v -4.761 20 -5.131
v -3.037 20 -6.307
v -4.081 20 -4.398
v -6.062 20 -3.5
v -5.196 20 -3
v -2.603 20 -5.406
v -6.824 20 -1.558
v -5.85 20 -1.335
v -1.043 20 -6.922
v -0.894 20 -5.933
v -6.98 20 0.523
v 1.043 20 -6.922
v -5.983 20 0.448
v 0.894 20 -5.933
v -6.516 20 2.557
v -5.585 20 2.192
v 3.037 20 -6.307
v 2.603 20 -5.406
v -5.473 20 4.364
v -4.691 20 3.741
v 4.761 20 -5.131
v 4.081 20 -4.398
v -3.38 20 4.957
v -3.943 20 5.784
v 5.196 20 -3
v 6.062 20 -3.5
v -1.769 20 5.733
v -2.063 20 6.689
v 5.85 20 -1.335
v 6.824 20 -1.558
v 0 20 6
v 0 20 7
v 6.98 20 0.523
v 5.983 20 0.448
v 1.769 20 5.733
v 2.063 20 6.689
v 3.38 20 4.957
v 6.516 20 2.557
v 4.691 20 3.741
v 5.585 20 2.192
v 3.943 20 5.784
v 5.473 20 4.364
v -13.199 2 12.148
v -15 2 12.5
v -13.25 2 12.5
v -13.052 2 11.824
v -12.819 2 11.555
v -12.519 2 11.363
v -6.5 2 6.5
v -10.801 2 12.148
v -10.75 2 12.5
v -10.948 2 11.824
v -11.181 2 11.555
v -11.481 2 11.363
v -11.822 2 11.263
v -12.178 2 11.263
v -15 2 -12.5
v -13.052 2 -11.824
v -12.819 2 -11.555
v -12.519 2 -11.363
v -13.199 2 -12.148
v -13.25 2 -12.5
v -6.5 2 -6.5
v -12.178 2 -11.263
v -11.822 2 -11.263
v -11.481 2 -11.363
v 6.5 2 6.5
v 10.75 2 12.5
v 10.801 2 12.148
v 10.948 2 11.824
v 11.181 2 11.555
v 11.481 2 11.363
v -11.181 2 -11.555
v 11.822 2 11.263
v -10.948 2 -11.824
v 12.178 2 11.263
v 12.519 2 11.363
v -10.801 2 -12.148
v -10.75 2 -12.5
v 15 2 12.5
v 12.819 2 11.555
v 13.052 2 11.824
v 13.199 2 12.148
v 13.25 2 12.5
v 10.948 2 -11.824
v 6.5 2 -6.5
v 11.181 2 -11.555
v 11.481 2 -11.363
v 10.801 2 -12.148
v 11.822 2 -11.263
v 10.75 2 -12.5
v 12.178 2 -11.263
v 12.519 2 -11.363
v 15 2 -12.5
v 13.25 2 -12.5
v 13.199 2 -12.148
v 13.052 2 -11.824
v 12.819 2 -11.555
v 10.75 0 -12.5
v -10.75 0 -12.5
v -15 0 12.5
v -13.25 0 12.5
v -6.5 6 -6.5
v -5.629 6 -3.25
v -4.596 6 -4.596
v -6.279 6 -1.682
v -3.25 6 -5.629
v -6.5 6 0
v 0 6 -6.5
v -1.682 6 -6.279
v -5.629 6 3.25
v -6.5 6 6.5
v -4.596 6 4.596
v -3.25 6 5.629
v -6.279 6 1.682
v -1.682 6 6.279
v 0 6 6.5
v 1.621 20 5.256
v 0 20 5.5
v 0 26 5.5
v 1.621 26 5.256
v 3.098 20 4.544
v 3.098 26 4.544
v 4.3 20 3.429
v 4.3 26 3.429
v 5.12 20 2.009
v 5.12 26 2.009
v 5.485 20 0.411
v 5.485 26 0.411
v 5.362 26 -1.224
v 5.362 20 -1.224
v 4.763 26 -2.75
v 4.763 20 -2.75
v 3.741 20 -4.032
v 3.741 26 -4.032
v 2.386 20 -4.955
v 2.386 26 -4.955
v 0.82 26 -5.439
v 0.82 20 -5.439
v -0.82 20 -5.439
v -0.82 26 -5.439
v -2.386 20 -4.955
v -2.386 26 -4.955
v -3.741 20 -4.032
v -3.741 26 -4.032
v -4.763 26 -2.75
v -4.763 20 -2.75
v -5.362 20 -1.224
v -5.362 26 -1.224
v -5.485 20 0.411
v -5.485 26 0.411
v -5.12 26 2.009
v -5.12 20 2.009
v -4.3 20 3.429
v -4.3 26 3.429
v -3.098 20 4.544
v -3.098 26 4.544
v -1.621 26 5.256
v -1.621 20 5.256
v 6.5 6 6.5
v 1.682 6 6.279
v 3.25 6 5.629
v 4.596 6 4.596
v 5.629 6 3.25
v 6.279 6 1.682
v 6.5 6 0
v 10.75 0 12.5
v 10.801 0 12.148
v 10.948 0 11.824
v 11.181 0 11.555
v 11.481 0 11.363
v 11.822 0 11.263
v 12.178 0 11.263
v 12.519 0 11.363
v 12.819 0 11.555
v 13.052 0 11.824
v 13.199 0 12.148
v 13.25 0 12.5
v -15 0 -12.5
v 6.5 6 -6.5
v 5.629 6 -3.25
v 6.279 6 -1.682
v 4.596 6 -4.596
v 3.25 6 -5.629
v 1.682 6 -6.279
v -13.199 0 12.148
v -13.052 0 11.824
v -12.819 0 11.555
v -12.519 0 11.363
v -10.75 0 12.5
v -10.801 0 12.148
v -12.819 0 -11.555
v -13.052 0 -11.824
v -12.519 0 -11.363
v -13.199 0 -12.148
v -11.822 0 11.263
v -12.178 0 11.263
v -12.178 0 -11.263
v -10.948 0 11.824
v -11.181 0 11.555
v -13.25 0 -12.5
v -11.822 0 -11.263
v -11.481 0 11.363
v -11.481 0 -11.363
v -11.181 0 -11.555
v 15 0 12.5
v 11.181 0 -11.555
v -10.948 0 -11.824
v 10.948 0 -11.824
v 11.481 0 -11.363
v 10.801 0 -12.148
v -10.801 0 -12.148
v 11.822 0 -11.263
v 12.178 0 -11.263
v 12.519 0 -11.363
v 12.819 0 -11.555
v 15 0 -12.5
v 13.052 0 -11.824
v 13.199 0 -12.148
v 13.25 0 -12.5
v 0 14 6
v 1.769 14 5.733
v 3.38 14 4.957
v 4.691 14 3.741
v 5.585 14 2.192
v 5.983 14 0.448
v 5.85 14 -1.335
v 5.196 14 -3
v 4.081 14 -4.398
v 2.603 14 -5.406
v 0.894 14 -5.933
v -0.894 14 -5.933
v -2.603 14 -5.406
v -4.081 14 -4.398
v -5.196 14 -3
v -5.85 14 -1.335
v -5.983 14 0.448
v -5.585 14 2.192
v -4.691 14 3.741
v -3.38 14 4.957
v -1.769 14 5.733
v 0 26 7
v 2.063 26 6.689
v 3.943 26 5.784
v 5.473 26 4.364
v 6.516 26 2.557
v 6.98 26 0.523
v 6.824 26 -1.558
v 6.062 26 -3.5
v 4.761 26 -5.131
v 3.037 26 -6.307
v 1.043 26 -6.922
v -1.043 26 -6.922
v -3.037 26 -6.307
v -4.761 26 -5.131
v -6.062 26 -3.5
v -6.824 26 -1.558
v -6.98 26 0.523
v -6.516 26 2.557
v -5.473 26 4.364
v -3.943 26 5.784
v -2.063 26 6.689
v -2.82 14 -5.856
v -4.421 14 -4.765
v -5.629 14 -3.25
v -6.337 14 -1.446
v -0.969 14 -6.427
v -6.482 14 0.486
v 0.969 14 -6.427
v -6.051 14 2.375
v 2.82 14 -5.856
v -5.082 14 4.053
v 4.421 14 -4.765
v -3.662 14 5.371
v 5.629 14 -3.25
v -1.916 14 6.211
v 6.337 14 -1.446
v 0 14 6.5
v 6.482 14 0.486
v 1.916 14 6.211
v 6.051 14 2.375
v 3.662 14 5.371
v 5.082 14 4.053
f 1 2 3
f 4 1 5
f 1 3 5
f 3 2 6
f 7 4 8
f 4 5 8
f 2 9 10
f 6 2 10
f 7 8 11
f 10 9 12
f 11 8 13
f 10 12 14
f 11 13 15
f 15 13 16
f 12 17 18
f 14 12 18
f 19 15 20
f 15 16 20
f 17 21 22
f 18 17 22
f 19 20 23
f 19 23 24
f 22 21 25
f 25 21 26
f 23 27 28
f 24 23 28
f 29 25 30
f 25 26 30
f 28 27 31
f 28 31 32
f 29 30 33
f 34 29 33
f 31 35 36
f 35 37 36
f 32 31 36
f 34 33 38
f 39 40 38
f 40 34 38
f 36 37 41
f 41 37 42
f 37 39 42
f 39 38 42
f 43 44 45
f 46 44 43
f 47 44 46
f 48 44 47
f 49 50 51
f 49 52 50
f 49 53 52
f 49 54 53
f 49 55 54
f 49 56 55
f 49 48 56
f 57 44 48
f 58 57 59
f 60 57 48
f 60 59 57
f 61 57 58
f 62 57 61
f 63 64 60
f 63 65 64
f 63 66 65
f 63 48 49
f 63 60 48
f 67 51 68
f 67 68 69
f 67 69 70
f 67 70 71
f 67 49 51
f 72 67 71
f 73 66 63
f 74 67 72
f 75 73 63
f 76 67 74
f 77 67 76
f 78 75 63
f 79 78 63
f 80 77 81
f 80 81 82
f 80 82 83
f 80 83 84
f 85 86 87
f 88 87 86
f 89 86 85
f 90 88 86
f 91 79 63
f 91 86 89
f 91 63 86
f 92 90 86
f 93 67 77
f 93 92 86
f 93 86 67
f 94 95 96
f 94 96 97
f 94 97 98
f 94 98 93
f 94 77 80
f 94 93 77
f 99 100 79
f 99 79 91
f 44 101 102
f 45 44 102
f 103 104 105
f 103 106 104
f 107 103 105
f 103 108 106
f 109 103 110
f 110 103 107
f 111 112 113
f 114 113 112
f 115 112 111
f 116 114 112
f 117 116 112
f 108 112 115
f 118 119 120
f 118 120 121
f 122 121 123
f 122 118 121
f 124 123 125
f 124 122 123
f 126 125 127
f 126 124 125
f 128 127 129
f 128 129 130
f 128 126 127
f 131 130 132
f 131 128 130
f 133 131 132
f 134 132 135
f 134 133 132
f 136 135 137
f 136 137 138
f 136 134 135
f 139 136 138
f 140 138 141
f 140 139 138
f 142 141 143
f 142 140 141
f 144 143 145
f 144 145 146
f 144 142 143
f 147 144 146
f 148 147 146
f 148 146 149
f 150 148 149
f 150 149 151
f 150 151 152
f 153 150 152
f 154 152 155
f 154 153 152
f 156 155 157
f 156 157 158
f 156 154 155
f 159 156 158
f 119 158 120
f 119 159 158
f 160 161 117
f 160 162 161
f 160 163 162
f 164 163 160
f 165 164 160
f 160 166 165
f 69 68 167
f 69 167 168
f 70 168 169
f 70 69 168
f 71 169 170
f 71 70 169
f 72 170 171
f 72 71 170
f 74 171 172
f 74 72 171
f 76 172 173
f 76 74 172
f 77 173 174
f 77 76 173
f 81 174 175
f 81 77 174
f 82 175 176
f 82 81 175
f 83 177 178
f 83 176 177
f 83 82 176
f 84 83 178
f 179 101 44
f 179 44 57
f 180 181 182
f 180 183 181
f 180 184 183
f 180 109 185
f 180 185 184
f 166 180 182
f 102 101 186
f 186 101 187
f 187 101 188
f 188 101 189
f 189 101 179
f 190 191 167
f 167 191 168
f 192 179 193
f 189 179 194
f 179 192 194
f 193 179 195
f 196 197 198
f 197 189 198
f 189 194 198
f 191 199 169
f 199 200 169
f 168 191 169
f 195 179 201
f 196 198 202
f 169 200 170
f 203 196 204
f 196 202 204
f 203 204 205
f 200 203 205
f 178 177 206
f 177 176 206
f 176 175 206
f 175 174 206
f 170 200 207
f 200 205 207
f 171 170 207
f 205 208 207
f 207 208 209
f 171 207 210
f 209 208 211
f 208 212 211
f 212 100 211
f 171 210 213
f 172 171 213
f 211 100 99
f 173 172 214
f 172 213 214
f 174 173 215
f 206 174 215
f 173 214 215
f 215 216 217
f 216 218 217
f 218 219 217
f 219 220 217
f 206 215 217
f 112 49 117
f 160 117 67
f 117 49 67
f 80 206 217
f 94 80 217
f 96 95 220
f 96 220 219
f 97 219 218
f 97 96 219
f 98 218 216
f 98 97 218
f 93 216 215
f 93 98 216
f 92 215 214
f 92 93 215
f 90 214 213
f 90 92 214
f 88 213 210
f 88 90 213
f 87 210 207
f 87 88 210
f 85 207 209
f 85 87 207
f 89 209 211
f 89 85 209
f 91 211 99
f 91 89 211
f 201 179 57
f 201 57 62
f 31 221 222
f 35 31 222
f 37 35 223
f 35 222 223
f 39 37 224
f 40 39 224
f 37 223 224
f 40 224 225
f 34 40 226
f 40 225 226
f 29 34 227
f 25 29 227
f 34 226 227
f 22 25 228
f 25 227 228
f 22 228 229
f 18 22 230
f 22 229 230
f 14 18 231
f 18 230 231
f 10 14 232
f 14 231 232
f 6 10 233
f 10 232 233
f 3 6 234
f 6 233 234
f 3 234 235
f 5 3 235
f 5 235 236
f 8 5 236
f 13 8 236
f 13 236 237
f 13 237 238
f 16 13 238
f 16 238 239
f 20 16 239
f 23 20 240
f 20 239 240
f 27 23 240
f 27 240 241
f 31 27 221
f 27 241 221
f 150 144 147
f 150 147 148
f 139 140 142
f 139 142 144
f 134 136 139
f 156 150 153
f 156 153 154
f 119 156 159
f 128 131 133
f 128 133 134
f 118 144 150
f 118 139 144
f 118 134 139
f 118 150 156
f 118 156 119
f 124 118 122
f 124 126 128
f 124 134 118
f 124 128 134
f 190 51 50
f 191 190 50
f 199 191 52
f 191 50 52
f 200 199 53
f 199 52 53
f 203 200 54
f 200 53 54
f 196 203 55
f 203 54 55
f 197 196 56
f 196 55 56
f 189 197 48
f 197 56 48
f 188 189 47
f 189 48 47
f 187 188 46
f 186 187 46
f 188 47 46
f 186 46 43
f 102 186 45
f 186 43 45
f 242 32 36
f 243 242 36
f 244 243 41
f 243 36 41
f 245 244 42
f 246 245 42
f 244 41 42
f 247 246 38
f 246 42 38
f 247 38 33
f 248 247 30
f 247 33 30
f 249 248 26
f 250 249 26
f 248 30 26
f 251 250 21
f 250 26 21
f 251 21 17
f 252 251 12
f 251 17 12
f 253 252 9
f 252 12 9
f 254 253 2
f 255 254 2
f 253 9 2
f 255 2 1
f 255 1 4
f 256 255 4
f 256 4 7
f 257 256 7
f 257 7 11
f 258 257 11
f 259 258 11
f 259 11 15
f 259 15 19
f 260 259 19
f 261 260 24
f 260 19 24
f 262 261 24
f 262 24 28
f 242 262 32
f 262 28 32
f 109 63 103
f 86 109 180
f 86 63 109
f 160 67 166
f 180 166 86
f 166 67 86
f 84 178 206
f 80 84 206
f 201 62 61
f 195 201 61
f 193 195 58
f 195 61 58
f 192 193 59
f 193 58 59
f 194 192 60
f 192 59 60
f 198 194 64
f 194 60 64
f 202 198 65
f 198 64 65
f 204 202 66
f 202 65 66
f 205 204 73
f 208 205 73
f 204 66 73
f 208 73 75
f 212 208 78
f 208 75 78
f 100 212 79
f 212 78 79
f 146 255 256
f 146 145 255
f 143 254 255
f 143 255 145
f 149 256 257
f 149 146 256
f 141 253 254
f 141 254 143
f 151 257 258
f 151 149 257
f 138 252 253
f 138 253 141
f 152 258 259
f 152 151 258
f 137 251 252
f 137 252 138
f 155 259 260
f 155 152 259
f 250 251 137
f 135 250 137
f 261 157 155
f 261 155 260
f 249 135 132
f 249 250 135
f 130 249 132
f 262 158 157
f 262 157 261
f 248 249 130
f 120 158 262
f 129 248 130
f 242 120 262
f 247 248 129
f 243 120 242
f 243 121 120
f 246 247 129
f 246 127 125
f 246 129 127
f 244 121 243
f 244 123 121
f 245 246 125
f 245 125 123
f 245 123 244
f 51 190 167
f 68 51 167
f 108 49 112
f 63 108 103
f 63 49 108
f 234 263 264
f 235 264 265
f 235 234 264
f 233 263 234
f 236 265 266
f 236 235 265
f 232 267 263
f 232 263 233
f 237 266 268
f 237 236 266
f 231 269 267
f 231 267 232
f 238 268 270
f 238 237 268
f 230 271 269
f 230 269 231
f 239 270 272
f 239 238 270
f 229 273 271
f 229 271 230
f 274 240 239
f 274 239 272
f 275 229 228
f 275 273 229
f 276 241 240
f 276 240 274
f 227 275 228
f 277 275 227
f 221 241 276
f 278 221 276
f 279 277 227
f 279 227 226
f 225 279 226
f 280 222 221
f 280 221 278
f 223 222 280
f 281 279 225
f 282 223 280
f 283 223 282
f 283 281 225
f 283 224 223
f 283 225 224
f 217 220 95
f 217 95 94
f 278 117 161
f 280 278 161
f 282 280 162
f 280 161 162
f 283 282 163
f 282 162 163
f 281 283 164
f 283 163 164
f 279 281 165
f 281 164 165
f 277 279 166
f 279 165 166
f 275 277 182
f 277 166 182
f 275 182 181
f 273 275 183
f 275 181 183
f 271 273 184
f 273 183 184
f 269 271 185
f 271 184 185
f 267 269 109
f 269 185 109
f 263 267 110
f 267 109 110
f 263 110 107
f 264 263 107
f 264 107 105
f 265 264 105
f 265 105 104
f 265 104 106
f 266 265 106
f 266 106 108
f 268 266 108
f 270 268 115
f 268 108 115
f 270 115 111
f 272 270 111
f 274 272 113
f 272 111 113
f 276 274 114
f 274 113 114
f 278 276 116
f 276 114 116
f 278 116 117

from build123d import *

# Parameters (mm, degrees)
SKETCH_1_W          = 30
SKETCH_1_H          = 25
EXTRUDE_1_DEPTH     = 2
SKETCH_2_R          = 1.25
CUT_EXTRUDE_1_DEPTH = 20.627786426
SKETCH_3_W          = 13
SKETCH_3_H          = 13
EXTRUDE_2_DEPTH     = 4
SKETCH_4_R          = 6.5
EXTRUDE_3_DEPTH     = 8
SKETCH_5_R          = 6
EXTRUDE_4_DEPTH     = 6
SKETCH_6_R          = 7
SKETCH_6_R_2        = 5.5
EXTRUDE_5_DEPTH     = 6


with BuildPart() as part:
    # 草圖1 → 填料-伸長1 (new body)
    with BuildSketch(Plane(origin=(0, 0, 0), x_dir=(1, 0, 0), z_dir=(0, 1, 0))):
        Rectangle(SKETCH_1_W, SKETCH_1_H)
    extrude(amount=EXTRUDE_1_DEPTH)

    # 草圖2 → 除料-伸長1 (cut, through all)
    with BuildSketch(Plane(origin=(0, 2, 0), x_dir=(1, 0, 0), z_dir=(0, 1, 0))):
        with Locations((-12, 12.5)):
            Circle(SKETCH_2_R)
        with Locations((-12, -12.5)):
            Circle(SKETCH_2_R)
    cut_extrude_1 = extrude(amount=-CUT_EXTRUDE_1_DEPTH, mode=Mode.SUBTRACT)

    # 鏡射1: 除料-伸長1 across plane
    add(cut_extrude_1.mirror(Plane(origin=(0, 0, 0), x_dir=(0, 0, 1), z_dir=(1, 0, 0))), mode=Mode.SUBTRACT)

    # 草圖3 → 填料-伸長2 (add)
    with BuildSketch(Plane(origin=(0, 2, 0), x_dir=(1, 0, 0), z_dir=(0, 1, 0))):
        Rectangle(SKETCH_3_W, SKETCH_3_H)
    extrude(amount=EXTRUDE_2_DEPTH)

    # 草圖4 → 填料-伸長3 (add)
    with BuildSketch(Plane(origin=(0, 6, 0), x_dir=(1, 0, 0), z_dir=(0, 1, 0))):
        with Locations(Location((0, 0, 0), (0, 0, 270))):
            Circle(SKETCH_4_R)
    extrude(amount=EXTRUDE_3_DEPTH)

    # 草圖5 → 填料-伸長4 (add)
    with BuildSketch(Plane(origin=(0, 14, 0), x_dir=(1, 0, 0), z_dir=(0, 1, 0))):
        with Locations(Location((0, 0, 0), (0, 0, 270))):
            Circle(SKETCH_5_R)
    extrude(amount=EXTRUDE_4_DEPTH)

    # 草圖6 → 填料-伸長5 (add)
    with BuildSketch(Plane(origin=(0, 20, 0), x_dir=(1, 0, 0), z_dir=(0, 1, 0))):
        with Locations(Location((0, 0, 0), (0, 0, 270))):
            Circle(SKETCH_6_R)
        with Locations(Location((0, 0, 0), (0, 0, 270))):
            Circle(SKETCH_6_R_2, mode=Mode.SUBTRACT)
    extrude(amount=EXTRUDE_5_DEPTH)


solid = part.part
